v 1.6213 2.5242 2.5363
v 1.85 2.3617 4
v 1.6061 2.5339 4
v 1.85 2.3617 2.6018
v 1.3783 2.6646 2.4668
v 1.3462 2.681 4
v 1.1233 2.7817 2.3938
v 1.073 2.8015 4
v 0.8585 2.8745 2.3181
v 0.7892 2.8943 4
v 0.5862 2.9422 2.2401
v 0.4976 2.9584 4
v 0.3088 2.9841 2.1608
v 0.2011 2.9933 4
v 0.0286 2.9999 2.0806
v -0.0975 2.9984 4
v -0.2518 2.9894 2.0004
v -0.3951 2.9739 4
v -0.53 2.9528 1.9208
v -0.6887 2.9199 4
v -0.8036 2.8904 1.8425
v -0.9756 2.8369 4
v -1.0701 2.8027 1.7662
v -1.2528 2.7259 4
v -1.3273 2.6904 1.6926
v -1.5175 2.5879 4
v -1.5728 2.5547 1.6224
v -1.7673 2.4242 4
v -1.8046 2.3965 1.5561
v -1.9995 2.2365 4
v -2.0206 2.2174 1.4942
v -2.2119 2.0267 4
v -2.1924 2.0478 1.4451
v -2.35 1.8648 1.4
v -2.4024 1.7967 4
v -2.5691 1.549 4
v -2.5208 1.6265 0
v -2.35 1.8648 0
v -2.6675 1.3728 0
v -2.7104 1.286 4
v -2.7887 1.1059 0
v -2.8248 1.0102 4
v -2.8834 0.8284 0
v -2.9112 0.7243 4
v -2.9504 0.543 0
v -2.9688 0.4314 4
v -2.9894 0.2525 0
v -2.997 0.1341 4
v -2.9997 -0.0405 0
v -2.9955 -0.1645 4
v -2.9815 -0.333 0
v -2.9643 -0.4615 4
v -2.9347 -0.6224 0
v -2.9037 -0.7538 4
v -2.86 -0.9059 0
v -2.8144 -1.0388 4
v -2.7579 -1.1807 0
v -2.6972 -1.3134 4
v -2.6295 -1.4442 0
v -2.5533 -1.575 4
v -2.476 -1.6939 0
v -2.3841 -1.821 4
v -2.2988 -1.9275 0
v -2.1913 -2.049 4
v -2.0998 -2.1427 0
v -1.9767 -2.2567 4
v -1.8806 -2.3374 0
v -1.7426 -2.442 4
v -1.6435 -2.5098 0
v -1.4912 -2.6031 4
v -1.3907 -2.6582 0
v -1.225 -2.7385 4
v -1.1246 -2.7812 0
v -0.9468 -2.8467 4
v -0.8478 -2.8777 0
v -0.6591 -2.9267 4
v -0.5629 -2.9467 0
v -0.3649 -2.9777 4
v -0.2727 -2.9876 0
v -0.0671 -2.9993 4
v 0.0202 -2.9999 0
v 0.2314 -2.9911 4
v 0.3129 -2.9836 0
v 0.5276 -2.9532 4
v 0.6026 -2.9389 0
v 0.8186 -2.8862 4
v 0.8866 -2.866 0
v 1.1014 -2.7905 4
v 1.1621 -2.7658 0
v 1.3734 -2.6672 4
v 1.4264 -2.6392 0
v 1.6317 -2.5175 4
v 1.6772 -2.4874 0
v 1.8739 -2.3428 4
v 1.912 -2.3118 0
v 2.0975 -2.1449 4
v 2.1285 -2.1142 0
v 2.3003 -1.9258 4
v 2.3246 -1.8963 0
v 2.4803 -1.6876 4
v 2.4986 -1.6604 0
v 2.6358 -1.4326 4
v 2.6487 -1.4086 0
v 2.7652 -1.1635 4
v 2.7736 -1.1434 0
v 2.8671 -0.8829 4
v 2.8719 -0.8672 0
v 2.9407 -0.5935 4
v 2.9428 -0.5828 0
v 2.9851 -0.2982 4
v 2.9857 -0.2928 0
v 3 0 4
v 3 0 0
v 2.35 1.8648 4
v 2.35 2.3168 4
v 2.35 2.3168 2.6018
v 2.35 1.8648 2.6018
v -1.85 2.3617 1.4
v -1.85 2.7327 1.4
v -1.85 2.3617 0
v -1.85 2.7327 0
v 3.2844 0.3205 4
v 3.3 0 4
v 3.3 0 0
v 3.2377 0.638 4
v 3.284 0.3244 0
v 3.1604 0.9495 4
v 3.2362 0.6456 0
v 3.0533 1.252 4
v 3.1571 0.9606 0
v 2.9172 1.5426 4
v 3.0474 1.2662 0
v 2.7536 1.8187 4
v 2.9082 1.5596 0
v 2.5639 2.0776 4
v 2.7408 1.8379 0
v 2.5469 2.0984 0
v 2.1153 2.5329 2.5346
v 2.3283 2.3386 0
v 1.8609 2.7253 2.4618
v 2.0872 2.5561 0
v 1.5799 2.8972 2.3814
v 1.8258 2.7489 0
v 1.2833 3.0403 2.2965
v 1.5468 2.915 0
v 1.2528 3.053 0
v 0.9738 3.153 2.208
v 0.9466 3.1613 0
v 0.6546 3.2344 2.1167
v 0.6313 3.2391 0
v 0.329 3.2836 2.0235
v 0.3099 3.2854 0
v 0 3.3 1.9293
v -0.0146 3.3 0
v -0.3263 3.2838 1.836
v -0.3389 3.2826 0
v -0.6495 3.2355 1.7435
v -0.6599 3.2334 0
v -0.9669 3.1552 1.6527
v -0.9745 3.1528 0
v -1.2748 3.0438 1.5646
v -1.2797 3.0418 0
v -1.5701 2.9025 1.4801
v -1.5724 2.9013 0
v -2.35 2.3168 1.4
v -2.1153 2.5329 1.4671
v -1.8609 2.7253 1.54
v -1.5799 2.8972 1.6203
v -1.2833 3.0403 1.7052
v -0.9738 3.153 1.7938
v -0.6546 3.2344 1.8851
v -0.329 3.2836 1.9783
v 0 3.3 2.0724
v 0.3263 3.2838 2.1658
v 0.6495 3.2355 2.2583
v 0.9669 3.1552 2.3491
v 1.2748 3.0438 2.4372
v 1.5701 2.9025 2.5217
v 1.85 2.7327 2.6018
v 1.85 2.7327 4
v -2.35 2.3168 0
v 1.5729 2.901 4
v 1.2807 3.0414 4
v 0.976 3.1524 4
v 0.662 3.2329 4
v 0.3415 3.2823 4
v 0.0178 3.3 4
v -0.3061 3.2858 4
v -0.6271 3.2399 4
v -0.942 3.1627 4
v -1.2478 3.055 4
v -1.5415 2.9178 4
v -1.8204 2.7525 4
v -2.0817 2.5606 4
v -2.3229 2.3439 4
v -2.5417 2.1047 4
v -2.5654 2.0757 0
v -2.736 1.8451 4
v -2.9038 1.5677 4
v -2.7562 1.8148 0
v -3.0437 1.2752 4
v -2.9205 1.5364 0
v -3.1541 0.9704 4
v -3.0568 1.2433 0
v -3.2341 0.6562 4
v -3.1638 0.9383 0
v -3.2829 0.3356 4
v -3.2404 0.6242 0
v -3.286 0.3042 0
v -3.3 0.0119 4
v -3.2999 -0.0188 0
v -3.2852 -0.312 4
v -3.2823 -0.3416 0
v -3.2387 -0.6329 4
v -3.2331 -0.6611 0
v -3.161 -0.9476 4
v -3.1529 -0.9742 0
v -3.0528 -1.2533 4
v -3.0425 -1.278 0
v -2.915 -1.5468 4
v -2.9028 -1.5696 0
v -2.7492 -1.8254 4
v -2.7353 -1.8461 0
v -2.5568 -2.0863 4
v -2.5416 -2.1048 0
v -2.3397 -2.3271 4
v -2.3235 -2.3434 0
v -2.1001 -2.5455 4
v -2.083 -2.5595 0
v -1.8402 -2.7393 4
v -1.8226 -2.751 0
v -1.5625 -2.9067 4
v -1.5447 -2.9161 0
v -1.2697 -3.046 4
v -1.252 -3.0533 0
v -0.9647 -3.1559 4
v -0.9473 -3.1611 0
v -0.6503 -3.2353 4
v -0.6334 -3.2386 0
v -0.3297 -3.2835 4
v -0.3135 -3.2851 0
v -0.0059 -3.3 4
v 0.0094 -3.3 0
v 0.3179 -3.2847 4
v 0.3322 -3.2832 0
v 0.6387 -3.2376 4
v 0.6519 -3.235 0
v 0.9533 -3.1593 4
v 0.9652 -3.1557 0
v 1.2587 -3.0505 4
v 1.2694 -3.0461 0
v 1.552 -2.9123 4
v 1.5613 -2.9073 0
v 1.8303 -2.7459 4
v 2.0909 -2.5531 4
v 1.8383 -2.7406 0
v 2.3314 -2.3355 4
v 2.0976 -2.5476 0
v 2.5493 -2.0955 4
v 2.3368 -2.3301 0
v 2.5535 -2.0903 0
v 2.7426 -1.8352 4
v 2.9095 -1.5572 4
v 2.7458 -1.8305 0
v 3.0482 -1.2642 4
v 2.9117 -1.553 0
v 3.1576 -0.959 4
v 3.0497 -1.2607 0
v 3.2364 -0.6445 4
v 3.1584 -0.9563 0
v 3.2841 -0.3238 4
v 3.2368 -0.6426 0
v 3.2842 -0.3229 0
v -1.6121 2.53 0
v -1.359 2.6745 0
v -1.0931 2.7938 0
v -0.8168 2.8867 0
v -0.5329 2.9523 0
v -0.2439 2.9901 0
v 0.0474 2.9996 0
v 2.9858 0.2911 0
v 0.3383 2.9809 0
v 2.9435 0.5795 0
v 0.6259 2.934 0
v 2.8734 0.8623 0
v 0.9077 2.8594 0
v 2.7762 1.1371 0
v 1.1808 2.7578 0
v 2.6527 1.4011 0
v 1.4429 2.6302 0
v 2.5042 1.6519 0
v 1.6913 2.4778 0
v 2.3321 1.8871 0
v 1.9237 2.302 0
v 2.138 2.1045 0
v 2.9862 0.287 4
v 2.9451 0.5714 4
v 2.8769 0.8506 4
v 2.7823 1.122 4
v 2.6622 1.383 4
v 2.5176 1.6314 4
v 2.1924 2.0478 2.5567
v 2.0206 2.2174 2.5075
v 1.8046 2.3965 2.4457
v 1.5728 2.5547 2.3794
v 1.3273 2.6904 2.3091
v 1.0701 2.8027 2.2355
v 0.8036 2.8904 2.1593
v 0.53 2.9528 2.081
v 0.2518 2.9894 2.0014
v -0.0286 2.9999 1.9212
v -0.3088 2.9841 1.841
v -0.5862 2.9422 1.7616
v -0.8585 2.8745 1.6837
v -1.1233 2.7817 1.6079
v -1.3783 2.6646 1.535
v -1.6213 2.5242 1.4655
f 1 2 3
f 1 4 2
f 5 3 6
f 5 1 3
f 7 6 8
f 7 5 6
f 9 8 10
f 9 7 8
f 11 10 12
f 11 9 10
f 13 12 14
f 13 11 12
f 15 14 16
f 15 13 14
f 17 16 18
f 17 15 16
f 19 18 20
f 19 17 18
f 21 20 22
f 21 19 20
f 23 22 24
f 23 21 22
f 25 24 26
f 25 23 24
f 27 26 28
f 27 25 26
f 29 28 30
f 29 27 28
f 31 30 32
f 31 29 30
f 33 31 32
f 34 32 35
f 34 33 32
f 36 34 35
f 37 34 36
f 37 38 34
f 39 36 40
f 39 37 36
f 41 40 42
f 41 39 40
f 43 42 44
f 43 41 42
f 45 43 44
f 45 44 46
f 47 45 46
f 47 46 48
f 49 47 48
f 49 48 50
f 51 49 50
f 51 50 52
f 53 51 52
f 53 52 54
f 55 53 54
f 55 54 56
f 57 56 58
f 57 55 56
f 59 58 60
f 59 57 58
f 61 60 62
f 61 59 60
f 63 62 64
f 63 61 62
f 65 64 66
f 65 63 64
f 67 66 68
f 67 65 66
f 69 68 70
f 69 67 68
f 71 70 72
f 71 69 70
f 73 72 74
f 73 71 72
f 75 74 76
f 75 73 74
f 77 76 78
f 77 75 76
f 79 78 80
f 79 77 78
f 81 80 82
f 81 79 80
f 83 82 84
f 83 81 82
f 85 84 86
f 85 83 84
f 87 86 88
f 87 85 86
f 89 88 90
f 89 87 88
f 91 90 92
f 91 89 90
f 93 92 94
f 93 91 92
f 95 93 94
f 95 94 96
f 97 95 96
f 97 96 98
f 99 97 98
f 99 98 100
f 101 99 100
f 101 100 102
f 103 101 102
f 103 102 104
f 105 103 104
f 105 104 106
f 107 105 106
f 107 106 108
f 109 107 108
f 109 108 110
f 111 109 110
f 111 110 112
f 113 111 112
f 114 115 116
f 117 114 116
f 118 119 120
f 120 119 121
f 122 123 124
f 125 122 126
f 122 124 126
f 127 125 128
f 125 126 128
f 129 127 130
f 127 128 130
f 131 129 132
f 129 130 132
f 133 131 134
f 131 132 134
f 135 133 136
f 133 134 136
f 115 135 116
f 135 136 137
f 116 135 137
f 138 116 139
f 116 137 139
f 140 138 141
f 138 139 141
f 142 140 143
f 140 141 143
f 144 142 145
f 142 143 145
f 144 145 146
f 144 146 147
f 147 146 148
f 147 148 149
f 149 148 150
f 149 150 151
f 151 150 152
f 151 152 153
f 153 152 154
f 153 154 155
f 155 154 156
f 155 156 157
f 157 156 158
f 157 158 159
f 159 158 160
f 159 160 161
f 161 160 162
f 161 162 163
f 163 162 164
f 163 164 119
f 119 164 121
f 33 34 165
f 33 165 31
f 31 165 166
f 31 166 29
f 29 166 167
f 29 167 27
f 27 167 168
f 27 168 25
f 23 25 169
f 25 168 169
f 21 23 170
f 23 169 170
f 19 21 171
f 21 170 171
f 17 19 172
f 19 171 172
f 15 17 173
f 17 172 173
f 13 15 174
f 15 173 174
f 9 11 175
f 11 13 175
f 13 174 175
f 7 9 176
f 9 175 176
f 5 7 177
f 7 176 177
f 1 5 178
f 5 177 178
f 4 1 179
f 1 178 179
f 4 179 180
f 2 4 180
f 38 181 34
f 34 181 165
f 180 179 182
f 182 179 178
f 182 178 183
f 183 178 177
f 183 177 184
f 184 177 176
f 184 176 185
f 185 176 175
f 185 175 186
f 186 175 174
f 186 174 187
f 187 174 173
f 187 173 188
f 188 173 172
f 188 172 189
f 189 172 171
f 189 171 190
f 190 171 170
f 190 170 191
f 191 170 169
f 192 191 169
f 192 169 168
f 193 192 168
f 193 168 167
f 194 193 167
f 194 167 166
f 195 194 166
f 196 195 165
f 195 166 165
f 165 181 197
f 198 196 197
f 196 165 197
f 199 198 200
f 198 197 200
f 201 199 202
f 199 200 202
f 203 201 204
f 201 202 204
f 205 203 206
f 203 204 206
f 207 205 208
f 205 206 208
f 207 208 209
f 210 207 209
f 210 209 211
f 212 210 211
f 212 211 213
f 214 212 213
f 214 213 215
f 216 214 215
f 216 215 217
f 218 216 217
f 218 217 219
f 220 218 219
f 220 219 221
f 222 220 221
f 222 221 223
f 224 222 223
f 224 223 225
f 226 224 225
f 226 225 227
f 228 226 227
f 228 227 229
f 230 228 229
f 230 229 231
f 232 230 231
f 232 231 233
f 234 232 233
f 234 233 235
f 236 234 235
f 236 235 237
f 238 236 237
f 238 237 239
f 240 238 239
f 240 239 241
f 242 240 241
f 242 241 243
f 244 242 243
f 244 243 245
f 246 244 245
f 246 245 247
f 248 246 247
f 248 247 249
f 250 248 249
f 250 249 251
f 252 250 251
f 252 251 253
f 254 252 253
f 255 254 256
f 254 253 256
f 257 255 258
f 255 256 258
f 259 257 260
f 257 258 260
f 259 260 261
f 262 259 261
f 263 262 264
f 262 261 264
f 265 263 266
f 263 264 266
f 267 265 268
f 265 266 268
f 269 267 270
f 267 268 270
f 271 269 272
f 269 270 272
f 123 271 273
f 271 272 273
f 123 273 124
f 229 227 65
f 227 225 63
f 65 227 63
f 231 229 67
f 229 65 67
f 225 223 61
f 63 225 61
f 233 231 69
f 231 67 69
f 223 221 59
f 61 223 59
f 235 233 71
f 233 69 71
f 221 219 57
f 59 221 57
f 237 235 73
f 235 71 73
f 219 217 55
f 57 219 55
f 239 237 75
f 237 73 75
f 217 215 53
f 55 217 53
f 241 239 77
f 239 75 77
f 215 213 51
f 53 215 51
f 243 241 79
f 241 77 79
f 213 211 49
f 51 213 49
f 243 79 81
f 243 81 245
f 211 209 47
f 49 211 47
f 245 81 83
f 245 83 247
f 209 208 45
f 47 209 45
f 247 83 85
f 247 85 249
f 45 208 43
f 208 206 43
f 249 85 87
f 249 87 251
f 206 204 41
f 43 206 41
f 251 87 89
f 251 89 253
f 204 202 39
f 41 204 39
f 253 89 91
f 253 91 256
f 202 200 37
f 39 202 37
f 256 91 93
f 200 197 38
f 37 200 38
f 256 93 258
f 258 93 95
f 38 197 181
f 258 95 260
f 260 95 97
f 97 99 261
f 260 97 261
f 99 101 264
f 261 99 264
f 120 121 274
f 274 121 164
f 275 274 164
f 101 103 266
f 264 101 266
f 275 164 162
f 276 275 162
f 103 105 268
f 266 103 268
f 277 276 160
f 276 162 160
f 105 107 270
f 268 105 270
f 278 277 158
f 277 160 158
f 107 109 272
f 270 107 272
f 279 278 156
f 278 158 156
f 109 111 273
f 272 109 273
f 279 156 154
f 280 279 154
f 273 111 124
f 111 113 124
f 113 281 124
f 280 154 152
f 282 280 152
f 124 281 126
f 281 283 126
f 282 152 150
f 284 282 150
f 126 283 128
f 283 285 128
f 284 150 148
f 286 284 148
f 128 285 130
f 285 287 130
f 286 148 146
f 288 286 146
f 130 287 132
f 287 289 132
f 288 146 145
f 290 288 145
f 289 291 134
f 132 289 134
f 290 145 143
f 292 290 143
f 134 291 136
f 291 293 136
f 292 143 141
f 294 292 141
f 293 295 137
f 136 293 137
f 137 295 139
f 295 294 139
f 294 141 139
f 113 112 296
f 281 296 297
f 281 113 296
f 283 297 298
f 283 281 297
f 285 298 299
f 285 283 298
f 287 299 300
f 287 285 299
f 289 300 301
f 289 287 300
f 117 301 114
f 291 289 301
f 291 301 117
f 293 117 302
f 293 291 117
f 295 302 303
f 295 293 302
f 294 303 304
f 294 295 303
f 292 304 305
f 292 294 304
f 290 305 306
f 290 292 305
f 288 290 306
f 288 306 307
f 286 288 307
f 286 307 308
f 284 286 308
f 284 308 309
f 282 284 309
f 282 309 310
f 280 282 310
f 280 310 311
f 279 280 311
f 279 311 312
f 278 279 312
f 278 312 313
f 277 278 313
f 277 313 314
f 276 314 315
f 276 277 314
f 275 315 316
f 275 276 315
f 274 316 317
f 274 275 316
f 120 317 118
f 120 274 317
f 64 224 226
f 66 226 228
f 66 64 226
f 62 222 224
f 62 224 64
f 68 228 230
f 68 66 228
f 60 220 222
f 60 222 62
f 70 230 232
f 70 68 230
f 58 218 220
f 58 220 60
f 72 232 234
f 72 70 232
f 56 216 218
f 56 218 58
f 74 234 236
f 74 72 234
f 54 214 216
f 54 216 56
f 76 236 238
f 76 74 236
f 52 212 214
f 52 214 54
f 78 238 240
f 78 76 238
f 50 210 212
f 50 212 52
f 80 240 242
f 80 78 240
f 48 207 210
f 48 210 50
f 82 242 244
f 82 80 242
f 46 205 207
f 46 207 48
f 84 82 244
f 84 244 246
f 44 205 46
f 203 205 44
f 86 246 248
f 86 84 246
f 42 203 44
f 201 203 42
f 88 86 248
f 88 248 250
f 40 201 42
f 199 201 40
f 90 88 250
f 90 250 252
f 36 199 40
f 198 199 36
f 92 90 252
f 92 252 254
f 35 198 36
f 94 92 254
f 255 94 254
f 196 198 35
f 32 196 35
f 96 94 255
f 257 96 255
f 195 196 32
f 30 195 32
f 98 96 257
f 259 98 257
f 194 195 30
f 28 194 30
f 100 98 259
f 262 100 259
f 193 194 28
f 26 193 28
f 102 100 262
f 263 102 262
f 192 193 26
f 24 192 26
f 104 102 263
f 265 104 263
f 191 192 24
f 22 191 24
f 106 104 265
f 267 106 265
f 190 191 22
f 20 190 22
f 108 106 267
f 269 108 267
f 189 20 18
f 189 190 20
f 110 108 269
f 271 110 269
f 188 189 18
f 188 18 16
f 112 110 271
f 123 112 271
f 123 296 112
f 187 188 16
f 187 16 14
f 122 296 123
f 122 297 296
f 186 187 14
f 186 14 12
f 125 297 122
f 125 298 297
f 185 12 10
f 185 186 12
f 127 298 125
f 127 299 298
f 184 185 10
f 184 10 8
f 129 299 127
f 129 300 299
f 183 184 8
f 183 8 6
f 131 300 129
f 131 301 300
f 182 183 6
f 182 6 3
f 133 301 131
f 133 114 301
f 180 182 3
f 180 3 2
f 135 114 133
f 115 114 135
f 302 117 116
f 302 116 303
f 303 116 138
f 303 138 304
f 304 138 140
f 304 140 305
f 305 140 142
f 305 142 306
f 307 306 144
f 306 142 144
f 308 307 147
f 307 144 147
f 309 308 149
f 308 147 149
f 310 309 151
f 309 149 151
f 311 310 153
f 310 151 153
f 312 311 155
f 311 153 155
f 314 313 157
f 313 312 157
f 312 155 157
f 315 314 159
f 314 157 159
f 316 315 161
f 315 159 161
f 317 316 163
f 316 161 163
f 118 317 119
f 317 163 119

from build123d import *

# Parameters (mm, degrees)
SKETCH2_R           = 3.3
SKETCH2_R_2         = 3
BOSS_EXTRUDE1_DEPTH = 4
CUT_EXTRUDE1_DEPTH  = 5


with BuildPart() as part:
    # Sketch2 → Boss-Extrude1 (new body)
    with BuildSketch(Plane.XY):
        Circle(SKETCH2_R)
        Circle(SKETCH2_R_2, mode=Mode.SUBTRACT)
    extrude(amount=BOSS_EXTRUDE1_DEPTH)

    # Sketch3 → Cut-Extrude1 (cut)
    with BuildSketch(Plane(origin=(0, 3.3, 0), x_dir=(1, 0, 0), z_dir=(0, 1, 0))):
        Polygon((1.85, -4), (2.35, -4), (2.35, -2.60176001), (-1.85, -1.4), (-1.85, 0), (-2.35, 0), (-2.35, -1.4), (1.85, -2.60176001), align=None)
    extrude(amount=-CUT_EXTRUDE1_DEPTH, mode=Mode.SUBTRACT)


solid = part.part
